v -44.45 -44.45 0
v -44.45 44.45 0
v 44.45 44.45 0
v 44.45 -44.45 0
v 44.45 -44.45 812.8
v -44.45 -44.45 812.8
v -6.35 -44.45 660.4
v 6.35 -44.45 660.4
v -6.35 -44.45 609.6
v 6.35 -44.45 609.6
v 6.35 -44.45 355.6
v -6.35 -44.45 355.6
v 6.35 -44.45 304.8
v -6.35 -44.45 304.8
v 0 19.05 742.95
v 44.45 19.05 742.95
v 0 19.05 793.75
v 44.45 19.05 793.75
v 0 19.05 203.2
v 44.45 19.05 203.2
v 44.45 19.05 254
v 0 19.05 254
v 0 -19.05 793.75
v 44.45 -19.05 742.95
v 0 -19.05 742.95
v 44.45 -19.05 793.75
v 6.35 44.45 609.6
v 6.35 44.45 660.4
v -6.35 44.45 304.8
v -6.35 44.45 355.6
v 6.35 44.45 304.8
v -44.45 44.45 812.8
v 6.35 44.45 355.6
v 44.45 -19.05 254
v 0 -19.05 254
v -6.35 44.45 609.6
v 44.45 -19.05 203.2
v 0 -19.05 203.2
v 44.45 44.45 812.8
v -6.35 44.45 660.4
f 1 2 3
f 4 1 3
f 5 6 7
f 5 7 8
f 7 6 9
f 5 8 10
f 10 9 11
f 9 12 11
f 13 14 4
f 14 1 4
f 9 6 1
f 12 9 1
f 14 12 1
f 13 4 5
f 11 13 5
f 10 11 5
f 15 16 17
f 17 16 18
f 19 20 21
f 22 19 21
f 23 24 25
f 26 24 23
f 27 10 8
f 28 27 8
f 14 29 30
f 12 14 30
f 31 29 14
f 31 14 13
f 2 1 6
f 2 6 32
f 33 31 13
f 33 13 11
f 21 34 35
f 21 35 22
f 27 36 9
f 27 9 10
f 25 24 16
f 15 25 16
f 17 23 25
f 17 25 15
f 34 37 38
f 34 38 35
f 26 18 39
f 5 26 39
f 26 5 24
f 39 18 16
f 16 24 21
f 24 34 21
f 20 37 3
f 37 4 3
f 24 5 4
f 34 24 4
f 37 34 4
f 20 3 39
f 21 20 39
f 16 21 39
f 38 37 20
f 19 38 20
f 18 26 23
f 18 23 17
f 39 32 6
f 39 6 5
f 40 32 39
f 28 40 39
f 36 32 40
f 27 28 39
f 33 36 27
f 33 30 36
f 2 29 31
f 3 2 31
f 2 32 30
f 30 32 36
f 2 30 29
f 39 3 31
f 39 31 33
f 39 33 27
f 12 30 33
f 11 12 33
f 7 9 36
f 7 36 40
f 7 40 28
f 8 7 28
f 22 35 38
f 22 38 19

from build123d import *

# Parameters (mm, degrees)
F0_W     = 88.9
F0_H     = 88.9
F1_DEPTH = 812.8
F2_W     = 38.1
F2_H     = 50.8
F3_DEPTH = 44.45
F4_W     = 12.7
F4_H     = 50.8
F5_DEPTH = 88.901


with BuildPart() as f1:
    # F0 (on Top) → F1 (new body)
    with BuildSketch(Plane.XY):
        Rectangle(F0_W, F0_H)
    extrude(amount=F1_DEPTH)

    # F2 (on face) → F3 (cut)
    with BuildSketch(Plane.YZ.offset(44.45)):
        with Locations((0, 768.35)):
            Rectangle(F2_W, F2_H)
        with Locations((0, 228.6)):
            Rectangle(F2_W, F2_H)
    extrude(amount=-F3_DEPTH, mode=Mode.SUBTRACT)

    # F4 (on face) → F5 (cut, through all)
    with BuildSketch(Plane.XZ.offset(44.45)):
        with Locations((0, 635)):
            Rectangle(F4_W, F4_H)
        with Locations((0, 330.2)):
            Rectangle(F4_W, F4_H)
    extrude(amount=-F5_DEPTH, mode=Mode.SUBTRACT)


solid = f1.part
